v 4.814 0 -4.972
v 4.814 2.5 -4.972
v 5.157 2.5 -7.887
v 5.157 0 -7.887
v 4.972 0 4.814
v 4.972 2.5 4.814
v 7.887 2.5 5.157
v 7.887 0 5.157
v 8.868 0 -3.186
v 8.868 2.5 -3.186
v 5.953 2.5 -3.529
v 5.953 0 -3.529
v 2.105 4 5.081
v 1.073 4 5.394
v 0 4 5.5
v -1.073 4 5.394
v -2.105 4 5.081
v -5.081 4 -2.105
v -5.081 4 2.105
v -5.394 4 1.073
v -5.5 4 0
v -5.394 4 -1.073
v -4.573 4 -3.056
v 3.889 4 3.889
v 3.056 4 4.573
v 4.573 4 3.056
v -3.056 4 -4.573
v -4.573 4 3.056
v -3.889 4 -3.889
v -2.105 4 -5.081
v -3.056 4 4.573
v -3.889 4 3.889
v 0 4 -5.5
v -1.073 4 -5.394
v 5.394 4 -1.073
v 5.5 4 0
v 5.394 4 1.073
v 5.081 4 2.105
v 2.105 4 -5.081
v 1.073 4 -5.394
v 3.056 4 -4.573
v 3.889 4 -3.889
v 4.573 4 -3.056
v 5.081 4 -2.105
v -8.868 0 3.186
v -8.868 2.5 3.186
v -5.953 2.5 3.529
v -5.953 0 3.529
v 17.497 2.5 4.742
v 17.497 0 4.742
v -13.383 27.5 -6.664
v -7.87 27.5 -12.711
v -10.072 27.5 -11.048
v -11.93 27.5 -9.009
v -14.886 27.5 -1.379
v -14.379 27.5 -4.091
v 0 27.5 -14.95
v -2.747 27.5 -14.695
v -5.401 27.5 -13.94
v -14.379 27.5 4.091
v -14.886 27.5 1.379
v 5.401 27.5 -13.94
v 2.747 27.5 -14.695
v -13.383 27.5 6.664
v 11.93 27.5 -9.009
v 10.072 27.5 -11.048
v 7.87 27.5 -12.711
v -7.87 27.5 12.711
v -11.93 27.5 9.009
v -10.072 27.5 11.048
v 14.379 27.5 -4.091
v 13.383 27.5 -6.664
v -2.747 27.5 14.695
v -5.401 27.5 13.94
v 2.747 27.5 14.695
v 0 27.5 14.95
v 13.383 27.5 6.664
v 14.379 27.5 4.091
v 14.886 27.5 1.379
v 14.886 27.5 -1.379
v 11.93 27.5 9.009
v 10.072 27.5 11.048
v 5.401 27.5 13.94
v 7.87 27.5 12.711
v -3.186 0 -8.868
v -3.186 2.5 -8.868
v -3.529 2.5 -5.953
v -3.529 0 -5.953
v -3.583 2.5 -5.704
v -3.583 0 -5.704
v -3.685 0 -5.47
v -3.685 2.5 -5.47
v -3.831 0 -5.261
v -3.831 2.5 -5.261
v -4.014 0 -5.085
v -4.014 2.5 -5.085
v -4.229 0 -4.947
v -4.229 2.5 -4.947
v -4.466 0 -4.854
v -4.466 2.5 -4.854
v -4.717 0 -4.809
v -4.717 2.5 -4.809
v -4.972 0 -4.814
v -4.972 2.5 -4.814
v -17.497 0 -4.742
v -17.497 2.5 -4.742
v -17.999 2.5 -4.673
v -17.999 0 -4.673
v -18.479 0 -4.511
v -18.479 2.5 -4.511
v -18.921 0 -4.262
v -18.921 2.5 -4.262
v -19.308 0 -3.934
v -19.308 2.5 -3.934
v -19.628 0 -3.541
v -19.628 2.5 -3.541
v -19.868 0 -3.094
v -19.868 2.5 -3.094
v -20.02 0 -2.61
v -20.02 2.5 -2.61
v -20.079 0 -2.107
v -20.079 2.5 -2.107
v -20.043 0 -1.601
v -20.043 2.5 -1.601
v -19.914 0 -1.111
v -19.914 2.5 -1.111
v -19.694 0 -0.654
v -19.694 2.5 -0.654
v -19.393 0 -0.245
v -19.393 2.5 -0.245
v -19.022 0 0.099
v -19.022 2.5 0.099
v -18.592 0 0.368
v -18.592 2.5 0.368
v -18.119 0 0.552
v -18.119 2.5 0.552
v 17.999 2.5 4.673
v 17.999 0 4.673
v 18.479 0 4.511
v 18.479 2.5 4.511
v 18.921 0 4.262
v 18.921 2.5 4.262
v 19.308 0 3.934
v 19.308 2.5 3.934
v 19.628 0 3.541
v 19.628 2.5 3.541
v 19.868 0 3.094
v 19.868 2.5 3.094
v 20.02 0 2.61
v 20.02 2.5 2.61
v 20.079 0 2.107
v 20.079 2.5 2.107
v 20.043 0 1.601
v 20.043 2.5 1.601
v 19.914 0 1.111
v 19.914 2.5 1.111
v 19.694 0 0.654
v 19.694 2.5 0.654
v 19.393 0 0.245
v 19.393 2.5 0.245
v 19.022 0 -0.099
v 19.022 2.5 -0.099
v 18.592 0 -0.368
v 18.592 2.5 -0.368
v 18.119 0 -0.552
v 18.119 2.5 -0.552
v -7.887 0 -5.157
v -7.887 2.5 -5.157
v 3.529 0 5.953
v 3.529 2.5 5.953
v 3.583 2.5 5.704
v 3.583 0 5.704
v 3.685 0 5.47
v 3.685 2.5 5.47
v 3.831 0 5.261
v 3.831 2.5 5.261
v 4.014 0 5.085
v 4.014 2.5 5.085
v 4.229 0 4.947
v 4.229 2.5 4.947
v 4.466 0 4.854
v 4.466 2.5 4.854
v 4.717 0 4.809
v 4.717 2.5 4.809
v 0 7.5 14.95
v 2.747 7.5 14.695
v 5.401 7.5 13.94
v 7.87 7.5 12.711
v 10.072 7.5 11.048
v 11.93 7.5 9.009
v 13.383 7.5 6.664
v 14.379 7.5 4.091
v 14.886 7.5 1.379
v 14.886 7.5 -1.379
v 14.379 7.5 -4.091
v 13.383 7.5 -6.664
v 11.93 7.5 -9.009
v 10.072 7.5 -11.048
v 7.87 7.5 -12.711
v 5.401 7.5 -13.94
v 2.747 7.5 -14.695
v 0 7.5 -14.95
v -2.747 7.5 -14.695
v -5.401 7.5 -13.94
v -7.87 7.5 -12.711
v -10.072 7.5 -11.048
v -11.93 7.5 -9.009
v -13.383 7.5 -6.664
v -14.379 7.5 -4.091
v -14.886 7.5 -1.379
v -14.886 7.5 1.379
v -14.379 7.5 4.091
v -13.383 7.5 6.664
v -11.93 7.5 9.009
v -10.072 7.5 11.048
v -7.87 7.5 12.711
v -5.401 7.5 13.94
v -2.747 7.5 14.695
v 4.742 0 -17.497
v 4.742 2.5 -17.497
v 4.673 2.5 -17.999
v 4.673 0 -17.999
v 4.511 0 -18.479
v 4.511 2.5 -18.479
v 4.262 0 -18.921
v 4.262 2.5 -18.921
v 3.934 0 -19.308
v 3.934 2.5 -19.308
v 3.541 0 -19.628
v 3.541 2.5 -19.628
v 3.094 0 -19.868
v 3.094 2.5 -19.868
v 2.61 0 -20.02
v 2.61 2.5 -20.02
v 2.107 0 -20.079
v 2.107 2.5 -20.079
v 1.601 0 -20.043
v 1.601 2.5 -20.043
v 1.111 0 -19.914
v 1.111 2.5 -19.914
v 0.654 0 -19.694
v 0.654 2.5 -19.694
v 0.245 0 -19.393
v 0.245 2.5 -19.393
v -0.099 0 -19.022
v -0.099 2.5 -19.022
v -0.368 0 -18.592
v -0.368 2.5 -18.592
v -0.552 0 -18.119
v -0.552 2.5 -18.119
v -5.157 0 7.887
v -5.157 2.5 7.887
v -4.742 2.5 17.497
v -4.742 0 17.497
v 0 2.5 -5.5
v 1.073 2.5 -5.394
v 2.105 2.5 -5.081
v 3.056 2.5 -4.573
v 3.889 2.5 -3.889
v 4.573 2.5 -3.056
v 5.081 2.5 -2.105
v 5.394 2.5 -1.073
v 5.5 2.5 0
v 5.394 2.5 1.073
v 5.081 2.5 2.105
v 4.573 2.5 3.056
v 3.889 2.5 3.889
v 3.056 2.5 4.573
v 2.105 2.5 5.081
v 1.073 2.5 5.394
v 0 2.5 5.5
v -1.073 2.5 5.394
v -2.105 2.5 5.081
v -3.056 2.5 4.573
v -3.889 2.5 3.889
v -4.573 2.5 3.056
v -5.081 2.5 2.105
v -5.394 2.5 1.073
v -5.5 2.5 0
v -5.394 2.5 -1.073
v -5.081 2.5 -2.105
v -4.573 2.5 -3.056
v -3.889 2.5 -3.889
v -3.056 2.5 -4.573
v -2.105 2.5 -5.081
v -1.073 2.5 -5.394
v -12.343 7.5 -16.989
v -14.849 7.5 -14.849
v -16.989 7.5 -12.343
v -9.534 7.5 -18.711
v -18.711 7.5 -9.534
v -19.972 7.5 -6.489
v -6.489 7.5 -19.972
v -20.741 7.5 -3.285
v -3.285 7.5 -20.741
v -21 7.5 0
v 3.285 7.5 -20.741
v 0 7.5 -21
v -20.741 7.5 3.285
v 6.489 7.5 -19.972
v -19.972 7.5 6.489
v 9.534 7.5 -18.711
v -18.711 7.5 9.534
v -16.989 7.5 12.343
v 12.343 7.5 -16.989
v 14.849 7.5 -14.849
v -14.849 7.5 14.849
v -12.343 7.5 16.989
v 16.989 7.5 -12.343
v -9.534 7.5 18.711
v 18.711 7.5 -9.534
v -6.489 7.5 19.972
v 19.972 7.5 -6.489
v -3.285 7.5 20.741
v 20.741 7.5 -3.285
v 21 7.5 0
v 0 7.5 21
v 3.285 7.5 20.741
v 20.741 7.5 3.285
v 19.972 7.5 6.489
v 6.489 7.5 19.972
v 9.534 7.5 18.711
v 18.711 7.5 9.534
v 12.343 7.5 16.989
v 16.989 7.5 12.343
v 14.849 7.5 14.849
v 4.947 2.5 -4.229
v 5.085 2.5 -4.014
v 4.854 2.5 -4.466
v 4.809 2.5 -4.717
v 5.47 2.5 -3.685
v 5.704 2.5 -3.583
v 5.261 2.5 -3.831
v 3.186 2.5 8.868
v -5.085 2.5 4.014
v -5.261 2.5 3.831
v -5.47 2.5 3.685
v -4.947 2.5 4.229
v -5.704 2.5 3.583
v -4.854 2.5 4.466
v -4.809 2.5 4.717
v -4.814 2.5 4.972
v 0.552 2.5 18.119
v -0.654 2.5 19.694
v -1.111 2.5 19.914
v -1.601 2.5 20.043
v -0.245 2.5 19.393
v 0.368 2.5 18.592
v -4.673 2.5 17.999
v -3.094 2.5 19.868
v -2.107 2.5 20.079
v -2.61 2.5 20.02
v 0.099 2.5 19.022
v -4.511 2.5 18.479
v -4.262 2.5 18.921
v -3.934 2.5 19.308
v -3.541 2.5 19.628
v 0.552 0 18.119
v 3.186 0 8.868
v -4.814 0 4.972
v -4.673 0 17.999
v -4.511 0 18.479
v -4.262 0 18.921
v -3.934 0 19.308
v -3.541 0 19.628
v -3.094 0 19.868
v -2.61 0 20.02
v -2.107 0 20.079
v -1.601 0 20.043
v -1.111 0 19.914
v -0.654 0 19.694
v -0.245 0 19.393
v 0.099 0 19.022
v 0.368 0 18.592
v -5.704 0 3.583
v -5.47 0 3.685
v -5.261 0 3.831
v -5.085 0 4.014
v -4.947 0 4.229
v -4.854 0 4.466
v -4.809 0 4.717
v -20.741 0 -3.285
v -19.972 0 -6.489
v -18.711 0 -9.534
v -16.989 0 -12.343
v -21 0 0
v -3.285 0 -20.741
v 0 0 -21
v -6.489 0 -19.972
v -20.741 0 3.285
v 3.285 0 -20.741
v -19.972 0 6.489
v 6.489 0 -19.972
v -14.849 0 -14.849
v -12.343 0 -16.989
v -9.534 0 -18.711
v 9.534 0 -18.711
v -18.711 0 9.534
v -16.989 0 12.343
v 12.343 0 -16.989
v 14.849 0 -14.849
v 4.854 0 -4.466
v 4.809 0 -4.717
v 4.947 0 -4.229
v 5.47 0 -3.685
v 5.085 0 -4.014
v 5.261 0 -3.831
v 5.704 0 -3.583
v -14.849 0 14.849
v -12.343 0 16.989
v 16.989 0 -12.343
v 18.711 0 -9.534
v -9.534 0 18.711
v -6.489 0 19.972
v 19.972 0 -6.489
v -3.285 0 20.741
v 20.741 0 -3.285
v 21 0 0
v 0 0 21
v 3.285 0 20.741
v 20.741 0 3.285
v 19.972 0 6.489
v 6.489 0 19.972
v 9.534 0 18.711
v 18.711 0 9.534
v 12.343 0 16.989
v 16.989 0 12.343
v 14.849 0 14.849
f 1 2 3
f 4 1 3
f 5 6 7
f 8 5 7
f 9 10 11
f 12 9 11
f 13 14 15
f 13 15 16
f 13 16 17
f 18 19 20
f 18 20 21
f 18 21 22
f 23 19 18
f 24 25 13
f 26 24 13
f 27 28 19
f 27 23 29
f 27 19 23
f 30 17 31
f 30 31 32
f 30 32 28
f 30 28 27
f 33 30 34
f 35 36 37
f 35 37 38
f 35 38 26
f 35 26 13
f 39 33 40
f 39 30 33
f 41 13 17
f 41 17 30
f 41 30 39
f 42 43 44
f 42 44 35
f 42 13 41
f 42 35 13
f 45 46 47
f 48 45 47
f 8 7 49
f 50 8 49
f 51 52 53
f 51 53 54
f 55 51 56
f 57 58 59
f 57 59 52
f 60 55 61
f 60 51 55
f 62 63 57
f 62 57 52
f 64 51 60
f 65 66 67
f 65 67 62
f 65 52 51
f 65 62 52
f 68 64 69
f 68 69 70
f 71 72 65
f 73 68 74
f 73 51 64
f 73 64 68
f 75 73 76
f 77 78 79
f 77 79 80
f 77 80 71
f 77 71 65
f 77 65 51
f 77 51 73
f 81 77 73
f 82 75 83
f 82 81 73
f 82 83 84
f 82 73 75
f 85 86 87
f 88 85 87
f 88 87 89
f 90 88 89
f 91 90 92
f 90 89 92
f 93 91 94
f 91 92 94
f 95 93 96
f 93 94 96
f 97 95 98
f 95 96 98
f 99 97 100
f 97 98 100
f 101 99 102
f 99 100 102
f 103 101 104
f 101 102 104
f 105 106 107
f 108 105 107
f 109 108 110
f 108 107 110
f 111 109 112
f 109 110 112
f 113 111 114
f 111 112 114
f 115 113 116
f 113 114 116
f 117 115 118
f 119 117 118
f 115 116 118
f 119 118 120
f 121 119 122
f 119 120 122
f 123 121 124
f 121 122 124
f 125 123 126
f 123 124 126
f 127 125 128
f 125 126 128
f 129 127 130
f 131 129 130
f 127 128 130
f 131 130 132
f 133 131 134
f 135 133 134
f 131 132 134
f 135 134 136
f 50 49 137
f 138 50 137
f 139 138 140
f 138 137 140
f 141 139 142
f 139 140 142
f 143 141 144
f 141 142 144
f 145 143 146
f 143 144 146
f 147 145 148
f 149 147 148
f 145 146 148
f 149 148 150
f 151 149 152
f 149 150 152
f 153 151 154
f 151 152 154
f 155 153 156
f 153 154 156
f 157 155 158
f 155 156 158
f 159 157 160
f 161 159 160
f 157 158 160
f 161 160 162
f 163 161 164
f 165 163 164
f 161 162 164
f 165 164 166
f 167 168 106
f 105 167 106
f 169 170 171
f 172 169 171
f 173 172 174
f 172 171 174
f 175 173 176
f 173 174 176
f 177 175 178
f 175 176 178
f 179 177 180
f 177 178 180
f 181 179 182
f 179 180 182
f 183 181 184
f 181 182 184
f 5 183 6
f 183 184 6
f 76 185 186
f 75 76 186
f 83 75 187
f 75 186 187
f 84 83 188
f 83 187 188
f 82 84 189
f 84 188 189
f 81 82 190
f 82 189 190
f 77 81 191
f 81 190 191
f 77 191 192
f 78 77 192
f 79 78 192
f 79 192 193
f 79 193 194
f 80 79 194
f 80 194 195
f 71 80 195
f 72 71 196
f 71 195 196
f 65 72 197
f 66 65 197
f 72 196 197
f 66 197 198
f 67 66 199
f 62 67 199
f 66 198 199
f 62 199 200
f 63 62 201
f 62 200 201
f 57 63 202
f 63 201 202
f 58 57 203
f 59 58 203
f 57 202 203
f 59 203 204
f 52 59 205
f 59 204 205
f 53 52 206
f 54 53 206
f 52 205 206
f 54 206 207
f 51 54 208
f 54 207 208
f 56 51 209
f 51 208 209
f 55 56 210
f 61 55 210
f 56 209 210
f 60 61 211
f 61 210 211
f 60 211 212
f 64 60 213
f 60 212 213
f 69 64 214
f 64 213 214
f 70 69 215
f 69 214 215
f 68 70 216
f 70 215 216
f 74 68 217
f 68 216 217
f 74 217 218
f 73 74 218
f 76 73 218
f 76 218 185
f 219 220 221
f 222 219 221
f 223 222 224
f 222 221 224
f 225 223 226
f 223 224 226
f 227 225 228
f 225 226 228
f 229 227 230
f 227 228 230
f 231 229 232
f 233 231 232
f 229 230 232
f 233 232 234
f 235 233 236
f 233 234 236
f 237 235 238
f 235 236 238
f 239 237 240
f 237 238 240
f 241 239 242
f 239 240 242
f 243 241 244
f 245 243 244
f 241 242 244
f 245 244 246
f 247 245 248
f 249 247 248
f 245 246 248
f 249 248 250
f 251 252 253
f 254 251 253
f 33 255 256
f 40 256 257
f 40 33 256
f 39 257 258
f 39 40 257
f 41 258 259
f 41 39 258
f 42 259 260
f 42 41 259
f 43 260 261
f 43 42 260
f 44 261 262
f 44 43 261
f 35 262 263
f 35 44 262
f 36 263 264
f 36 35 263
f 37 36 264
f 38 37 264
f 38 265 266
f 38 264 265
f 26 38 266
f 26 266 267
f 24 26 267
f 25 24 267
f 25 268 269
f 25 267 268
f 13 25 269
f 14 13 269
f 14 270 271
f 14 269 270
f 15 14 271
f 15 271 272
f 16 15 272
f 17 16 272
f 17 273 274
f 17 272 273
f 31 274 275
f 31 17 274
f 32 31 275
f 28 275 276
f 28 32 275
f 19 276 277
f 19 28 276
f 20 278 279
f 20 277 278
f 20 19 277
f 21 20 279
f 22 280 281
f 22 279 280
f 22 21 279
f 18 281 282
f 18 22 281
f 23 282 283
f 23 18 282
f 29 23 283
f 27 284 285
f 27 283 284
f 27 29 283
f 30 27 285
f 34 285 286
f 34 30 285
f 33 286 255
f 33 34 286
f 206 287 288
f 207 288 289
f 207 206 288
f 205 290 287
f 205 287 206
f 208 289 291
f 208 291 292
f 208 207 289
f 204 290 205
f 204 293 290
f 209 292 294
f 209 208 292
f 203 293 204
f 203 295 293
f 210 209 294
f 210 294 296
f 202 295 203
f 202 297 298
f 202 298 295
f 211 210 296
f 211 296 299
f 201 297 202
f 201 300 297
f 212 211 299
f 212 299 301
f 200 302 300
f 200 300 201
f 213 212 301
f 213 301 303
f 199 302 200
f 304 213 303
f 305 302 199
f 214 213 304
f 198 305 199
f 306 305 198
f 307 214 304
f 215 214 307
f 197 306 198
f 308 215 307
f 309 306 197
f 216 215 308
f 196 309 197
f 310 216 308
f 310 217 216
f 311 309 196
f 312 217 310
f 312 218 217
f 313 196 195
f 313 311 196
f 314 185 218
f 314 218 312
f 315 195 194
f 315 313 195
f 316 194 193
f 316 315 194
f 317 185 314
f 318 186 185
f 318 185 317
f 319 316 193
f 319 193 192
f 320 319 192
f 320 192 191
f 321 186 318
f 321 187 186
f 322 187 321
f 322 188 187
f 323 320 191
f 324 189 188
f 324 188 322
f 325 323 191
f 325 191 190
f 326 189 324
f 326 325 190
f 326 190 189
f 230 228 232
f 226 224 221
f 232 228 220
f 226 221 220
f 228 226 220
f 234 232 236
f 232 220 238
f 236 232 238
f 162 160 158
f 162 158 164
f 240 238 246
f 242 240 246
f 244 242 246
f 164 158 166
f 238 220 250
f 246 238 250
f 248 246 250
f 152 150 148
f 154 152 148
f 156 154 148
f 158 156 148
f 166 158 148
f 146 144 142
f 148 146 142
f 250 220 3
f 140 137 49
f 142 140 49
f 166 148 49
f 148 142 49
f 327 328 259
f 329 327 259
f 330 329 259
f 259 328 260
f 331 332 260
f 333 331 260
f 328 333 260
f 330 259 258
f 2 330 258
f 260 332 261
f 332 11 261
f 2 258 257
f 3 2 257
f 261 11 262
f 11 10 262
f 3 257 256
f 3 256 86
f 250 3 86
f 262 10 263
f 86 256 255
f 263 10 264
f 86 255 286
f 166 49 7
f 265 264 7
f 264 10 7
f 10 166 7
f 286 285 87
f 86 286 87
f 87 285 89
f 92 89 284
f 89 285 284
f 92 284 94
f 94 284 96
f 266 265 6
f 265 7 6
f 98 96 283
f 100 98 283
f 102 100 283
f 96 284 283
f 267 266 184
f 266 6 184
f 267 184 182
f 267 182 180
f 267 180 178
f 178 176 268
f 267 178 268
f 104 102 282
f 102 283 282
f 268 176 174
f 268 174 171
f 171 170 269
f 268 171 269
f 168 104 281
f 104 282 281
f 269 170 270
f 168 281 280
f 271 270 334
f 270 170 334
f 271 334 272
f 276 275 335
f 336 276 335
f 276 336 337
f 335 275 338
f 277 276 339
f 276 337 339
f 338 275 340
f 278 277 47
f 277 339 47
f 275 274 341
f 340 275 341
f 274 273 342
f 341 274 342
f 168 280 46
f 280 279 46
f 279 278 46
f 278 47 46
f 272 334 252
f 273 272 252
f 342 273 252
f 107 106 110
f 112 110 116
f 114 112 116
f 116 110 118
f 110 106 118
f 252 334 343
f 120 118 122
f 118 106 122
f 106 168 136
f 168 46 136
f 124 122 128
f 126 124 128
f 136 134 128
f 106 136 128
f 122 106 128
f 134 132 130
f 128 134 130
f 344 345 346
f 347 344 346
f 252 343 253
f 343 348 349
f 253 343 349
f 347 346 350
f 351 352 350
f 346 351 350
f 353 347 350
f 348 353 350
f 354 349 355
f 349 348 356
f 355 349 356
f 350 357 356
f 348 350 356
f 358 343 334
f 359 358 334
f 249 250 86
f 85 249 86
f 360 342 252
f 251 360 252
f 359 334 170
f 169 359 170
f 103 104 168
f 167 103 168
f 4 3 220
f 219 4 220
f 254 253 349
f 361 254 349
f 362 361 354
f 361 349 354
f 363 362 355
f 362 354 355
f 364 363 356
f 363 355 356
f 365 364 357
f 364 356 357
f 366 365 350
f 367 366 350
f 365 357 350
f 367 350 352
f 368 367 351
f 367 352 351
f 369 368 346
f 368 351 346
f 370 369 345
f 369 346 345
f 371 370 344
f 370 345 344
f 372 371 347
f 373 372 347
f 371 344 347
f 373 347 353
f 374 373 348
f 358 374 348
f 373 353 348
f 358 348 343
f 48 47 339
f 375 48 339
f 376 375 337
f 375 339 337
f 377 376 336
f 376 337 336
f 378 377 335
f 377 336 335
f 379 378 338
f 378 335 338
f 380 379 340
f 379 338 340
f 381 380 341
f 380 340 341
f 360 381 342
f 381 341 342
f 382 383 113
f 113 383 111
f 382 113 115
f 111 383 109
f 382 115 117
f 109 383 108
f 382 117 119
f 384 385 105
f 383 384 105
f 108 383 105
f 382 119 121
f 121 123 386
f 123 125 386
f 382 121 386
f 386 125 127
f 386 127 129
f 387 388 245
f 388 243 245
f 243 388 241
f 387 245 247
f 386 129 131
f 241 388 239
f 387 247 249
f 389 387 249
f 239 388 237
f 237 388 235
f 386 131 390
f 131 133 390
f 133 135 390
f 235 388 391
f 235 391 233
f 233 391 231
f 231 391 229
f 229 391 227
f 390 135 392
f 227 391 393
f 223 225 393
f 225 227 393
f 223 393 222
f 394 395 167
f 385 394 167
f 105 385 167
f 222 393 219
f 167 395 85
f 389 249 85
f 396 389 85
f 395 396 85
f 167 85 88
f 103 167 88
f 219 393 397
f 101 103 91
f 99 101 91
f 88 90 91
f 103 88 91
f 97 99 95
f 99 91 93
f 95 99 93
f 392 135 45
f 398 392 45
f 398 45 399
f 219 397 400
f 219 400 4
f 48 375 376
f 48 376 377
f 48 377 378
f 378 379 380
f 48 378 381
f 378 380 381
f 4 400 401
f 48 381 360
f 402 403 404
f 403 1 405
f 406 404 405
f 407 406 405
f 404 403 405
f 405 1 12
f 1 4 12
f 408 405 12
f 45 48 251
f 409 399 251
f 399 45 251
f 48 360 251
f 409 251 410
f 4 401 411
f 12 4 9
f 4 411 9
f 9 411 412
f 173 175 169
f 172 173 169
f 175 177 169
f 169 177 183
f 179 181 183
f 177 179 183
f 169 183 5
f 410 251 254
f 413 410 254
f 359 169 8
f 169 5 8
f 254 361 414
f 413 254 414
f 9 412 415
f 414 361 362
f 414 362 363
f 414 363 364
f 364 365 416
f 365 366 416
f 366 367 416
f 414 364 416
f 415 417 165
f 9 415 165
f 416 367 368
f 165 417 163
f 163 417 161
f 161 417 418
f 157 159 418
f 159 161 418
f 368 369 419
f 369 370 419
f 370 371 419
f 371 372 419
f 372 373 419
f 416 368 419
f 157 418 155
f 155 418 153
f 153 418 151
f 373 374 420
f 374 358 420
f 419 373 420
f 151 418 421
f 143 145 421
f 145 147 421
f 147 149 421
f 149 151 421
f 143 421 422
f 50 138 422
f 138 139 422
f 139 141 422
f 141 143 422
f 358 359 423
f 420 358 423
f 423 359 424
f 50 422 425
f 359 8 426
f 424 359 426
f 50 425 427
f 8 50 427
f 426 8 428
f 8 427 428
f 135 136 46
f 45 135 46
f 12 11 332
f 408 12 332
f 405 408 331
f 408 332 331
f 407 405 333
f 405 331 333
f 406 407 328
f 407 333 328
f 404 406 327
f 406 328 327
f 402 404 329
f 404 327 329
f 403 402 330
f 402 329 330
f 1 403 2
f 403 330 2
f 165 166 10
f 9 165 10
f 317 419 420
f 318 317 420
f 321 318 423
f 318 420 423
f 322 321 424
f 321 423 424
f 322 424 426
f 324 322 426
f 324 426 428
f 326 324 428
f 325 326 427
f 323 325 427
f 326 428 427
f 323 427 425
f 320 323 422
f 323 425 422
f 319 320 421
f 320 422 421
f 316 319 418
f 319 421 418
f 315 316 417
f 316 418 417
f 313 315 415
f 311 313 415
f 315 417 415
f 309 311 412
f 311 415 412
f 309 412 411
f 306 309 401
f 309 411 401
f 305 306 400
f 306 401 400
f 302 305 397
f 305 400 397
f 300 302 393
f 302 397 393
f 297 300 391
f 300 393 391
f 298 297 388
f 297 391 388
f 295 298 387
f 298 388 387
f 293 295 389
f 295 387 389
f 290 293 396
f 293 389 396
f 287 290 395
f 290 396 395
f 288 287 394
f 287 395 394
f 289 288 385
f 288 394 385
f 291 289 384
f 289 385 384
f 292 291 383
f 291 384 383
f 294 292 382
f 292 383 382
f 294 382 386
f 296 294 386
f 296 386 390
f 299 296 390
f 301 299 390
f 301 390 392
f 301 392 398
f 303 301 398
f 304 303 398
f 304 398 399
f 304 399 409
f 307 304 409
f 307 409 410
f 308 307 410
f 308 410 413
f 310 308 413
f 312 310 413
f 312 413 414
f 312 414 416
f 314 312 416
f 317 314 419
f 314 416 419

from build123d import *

# Parameters (mm, degrees)
CROQUIS1_R                 = 21
SALIENTE_EXTRUIR1_DEPTH    = 7.5
CROQUIS2_R                 = 14.95
SALIENTE_EXTRUIR2_DEPTH    = 20
CORTAR_EXTRUIR1_DEPTH      = 41.475301111
CORTAR_EXTRUIR1_DEPTH_BACK = 2.5
CORTAR_EXTRUIR2_DEPTH      = 39.820097888
CORTAR_EXTRUIR2_DEPTH_BACK = 1.5
CROQUIS4_R                 = 5.5


with BuildPart() as part:
    # Croquis1 → Saliente-Extruir1 (new body)
    with BuildSketch(Plane(origin=(0, 0, 0), x_dir=(1, 0, 0), z_dir=(0, 1, 0))):
        with Locations(Location((0, 0, 0), (0, 0, 270))):
            Circle(CROQUIS1_R)
    extrude(amount=SALIENTE_EXTRUIR1_DEPTH)

    # Croquis2 → Saliente-Extruir2 (add)
    with BuildSketch(Plane(origin=(0, 7.5, 0), x_dir=(1, 0, 0), z_dir=(0, 1, 0))):
        with Locations(Location((0, 0, 0), (0, 0, 270))):
            Circle(CROQUIS2_R)
    extrude(amount=SALIENTE_EXTRUIR2_DEPTH)

    # Croquis3 → Cortar-Extruir1 (cut, two sides: drawn at the far end of the back side and taken through both)
    with BuildSketch(Plane.XZ.offset(-CORTAR_EXTRUIR1_DEPTH_BACK)):
        with BuildLine():
            Line((-4.971667622, -4.813784484), (-7.886808716, -5.156697725))
            Line((-7.886808716, -5.156697725), (-17.496587444, -4.741948795))
            ThreePointArc((-17.496587444, -4.741948795), (-20.06167777, -2.359890899), (-18.11936882, 0.552380405))
            Line((-18.11936882, 0.552380405), (-8.868149486, 3.18578214))
            Line((-8.868149486, 3.18578214), (-5.953008392, 3.528695381))
            ThreePointArc((-5.953008392, 3.528695381), (-5.084547102, 4.014240505), (-4.813784484, 4.971667622))
            Line((-4.813784484, 4.971667622), (-5.156697725, 7.886808716))
            Line((-5.156697725, 7.886808716), (-4.741948795, 17.496587444))
            ThreePointArc((-4.741948795, 17.496587444), (-2.359890899, 20.06167777), (0.552380405, 18.11936882))
            Line((0.552380405, 18.11936882), (3.18578214, 8.868149486))
            Line((3.18578214, 8.868149486), (3.528695381, 5.953008392))
            ThreePointArc((3.528695381, 5.953008392), (4.014240505, 5.084547102), (4.971667622, 4.813784484))
            Line((4.971667622, 4.813784484), (7.886808716, 5.156697725))
            Line((7.886808716, 5.156697725), (17.496587444, 4.741948795))
            ThreePointArc((17.496587444, 4.741948795), (20.06167777, 2.359890899), (18.11936882, -0.552380405))
            Line((18.11936882, -0.552380405), (8.868149486, -3.18578214))
            Line((8.868149486, -3.18578214), (5.953008392, -3.528695381))
            ThreePointArc((5.953008392, -3.528695381), (5.084547102, -4.014240505), (4.813784484, -4.971667622))
            Line((4.813784484, -4.971667622), (5.156697725, -7.886808716))
            Line((5.156697725, -7.886808716), (4.741948795, -17.496587444))
            ThreePointArc((4.741948795, -17.496587444), (2.359890899, -20.06167777), (-0.552380405, -18.11936882))
            Line((-0.552380405, -18.11936882), (-3.18578214, -8.868149486))
            Line((-3.18578214, -8.868149486), (-3.528695381, -5.953008392))
            ThreePointArc((-3.528695381, -5.953008392), (-4.014240505, -5.084547102), (-4.971667622, -4.813784484))
        make_face()
    extrude(amount=CORTAR_EXTRUIR1_DEPTH + CORTAR_EXTRUIR1_DEPTH_BACK, mode=Mode.SUBTRACT)

    # Croquis4 → Cortar-Extruir2 (cut, two sides: drawn at the far end of the back side and taken through both)
    with BuildSketch(Plane.XZ.offset(-2.5).offset(-CORTAR_EXTRUIR2_DEPTH_BACK)):
        with Locations(Location((0, 0, 0), (0, 0, 270))):
            Circle(CROQUIS4_R)
    extrude(amount=CORTAR_EXTRUIR2_DEPTH + CORTAR_EXTRUIR2_DEPTH_BACK, mode=Mode.SUBTRACT)


solid = part.part
